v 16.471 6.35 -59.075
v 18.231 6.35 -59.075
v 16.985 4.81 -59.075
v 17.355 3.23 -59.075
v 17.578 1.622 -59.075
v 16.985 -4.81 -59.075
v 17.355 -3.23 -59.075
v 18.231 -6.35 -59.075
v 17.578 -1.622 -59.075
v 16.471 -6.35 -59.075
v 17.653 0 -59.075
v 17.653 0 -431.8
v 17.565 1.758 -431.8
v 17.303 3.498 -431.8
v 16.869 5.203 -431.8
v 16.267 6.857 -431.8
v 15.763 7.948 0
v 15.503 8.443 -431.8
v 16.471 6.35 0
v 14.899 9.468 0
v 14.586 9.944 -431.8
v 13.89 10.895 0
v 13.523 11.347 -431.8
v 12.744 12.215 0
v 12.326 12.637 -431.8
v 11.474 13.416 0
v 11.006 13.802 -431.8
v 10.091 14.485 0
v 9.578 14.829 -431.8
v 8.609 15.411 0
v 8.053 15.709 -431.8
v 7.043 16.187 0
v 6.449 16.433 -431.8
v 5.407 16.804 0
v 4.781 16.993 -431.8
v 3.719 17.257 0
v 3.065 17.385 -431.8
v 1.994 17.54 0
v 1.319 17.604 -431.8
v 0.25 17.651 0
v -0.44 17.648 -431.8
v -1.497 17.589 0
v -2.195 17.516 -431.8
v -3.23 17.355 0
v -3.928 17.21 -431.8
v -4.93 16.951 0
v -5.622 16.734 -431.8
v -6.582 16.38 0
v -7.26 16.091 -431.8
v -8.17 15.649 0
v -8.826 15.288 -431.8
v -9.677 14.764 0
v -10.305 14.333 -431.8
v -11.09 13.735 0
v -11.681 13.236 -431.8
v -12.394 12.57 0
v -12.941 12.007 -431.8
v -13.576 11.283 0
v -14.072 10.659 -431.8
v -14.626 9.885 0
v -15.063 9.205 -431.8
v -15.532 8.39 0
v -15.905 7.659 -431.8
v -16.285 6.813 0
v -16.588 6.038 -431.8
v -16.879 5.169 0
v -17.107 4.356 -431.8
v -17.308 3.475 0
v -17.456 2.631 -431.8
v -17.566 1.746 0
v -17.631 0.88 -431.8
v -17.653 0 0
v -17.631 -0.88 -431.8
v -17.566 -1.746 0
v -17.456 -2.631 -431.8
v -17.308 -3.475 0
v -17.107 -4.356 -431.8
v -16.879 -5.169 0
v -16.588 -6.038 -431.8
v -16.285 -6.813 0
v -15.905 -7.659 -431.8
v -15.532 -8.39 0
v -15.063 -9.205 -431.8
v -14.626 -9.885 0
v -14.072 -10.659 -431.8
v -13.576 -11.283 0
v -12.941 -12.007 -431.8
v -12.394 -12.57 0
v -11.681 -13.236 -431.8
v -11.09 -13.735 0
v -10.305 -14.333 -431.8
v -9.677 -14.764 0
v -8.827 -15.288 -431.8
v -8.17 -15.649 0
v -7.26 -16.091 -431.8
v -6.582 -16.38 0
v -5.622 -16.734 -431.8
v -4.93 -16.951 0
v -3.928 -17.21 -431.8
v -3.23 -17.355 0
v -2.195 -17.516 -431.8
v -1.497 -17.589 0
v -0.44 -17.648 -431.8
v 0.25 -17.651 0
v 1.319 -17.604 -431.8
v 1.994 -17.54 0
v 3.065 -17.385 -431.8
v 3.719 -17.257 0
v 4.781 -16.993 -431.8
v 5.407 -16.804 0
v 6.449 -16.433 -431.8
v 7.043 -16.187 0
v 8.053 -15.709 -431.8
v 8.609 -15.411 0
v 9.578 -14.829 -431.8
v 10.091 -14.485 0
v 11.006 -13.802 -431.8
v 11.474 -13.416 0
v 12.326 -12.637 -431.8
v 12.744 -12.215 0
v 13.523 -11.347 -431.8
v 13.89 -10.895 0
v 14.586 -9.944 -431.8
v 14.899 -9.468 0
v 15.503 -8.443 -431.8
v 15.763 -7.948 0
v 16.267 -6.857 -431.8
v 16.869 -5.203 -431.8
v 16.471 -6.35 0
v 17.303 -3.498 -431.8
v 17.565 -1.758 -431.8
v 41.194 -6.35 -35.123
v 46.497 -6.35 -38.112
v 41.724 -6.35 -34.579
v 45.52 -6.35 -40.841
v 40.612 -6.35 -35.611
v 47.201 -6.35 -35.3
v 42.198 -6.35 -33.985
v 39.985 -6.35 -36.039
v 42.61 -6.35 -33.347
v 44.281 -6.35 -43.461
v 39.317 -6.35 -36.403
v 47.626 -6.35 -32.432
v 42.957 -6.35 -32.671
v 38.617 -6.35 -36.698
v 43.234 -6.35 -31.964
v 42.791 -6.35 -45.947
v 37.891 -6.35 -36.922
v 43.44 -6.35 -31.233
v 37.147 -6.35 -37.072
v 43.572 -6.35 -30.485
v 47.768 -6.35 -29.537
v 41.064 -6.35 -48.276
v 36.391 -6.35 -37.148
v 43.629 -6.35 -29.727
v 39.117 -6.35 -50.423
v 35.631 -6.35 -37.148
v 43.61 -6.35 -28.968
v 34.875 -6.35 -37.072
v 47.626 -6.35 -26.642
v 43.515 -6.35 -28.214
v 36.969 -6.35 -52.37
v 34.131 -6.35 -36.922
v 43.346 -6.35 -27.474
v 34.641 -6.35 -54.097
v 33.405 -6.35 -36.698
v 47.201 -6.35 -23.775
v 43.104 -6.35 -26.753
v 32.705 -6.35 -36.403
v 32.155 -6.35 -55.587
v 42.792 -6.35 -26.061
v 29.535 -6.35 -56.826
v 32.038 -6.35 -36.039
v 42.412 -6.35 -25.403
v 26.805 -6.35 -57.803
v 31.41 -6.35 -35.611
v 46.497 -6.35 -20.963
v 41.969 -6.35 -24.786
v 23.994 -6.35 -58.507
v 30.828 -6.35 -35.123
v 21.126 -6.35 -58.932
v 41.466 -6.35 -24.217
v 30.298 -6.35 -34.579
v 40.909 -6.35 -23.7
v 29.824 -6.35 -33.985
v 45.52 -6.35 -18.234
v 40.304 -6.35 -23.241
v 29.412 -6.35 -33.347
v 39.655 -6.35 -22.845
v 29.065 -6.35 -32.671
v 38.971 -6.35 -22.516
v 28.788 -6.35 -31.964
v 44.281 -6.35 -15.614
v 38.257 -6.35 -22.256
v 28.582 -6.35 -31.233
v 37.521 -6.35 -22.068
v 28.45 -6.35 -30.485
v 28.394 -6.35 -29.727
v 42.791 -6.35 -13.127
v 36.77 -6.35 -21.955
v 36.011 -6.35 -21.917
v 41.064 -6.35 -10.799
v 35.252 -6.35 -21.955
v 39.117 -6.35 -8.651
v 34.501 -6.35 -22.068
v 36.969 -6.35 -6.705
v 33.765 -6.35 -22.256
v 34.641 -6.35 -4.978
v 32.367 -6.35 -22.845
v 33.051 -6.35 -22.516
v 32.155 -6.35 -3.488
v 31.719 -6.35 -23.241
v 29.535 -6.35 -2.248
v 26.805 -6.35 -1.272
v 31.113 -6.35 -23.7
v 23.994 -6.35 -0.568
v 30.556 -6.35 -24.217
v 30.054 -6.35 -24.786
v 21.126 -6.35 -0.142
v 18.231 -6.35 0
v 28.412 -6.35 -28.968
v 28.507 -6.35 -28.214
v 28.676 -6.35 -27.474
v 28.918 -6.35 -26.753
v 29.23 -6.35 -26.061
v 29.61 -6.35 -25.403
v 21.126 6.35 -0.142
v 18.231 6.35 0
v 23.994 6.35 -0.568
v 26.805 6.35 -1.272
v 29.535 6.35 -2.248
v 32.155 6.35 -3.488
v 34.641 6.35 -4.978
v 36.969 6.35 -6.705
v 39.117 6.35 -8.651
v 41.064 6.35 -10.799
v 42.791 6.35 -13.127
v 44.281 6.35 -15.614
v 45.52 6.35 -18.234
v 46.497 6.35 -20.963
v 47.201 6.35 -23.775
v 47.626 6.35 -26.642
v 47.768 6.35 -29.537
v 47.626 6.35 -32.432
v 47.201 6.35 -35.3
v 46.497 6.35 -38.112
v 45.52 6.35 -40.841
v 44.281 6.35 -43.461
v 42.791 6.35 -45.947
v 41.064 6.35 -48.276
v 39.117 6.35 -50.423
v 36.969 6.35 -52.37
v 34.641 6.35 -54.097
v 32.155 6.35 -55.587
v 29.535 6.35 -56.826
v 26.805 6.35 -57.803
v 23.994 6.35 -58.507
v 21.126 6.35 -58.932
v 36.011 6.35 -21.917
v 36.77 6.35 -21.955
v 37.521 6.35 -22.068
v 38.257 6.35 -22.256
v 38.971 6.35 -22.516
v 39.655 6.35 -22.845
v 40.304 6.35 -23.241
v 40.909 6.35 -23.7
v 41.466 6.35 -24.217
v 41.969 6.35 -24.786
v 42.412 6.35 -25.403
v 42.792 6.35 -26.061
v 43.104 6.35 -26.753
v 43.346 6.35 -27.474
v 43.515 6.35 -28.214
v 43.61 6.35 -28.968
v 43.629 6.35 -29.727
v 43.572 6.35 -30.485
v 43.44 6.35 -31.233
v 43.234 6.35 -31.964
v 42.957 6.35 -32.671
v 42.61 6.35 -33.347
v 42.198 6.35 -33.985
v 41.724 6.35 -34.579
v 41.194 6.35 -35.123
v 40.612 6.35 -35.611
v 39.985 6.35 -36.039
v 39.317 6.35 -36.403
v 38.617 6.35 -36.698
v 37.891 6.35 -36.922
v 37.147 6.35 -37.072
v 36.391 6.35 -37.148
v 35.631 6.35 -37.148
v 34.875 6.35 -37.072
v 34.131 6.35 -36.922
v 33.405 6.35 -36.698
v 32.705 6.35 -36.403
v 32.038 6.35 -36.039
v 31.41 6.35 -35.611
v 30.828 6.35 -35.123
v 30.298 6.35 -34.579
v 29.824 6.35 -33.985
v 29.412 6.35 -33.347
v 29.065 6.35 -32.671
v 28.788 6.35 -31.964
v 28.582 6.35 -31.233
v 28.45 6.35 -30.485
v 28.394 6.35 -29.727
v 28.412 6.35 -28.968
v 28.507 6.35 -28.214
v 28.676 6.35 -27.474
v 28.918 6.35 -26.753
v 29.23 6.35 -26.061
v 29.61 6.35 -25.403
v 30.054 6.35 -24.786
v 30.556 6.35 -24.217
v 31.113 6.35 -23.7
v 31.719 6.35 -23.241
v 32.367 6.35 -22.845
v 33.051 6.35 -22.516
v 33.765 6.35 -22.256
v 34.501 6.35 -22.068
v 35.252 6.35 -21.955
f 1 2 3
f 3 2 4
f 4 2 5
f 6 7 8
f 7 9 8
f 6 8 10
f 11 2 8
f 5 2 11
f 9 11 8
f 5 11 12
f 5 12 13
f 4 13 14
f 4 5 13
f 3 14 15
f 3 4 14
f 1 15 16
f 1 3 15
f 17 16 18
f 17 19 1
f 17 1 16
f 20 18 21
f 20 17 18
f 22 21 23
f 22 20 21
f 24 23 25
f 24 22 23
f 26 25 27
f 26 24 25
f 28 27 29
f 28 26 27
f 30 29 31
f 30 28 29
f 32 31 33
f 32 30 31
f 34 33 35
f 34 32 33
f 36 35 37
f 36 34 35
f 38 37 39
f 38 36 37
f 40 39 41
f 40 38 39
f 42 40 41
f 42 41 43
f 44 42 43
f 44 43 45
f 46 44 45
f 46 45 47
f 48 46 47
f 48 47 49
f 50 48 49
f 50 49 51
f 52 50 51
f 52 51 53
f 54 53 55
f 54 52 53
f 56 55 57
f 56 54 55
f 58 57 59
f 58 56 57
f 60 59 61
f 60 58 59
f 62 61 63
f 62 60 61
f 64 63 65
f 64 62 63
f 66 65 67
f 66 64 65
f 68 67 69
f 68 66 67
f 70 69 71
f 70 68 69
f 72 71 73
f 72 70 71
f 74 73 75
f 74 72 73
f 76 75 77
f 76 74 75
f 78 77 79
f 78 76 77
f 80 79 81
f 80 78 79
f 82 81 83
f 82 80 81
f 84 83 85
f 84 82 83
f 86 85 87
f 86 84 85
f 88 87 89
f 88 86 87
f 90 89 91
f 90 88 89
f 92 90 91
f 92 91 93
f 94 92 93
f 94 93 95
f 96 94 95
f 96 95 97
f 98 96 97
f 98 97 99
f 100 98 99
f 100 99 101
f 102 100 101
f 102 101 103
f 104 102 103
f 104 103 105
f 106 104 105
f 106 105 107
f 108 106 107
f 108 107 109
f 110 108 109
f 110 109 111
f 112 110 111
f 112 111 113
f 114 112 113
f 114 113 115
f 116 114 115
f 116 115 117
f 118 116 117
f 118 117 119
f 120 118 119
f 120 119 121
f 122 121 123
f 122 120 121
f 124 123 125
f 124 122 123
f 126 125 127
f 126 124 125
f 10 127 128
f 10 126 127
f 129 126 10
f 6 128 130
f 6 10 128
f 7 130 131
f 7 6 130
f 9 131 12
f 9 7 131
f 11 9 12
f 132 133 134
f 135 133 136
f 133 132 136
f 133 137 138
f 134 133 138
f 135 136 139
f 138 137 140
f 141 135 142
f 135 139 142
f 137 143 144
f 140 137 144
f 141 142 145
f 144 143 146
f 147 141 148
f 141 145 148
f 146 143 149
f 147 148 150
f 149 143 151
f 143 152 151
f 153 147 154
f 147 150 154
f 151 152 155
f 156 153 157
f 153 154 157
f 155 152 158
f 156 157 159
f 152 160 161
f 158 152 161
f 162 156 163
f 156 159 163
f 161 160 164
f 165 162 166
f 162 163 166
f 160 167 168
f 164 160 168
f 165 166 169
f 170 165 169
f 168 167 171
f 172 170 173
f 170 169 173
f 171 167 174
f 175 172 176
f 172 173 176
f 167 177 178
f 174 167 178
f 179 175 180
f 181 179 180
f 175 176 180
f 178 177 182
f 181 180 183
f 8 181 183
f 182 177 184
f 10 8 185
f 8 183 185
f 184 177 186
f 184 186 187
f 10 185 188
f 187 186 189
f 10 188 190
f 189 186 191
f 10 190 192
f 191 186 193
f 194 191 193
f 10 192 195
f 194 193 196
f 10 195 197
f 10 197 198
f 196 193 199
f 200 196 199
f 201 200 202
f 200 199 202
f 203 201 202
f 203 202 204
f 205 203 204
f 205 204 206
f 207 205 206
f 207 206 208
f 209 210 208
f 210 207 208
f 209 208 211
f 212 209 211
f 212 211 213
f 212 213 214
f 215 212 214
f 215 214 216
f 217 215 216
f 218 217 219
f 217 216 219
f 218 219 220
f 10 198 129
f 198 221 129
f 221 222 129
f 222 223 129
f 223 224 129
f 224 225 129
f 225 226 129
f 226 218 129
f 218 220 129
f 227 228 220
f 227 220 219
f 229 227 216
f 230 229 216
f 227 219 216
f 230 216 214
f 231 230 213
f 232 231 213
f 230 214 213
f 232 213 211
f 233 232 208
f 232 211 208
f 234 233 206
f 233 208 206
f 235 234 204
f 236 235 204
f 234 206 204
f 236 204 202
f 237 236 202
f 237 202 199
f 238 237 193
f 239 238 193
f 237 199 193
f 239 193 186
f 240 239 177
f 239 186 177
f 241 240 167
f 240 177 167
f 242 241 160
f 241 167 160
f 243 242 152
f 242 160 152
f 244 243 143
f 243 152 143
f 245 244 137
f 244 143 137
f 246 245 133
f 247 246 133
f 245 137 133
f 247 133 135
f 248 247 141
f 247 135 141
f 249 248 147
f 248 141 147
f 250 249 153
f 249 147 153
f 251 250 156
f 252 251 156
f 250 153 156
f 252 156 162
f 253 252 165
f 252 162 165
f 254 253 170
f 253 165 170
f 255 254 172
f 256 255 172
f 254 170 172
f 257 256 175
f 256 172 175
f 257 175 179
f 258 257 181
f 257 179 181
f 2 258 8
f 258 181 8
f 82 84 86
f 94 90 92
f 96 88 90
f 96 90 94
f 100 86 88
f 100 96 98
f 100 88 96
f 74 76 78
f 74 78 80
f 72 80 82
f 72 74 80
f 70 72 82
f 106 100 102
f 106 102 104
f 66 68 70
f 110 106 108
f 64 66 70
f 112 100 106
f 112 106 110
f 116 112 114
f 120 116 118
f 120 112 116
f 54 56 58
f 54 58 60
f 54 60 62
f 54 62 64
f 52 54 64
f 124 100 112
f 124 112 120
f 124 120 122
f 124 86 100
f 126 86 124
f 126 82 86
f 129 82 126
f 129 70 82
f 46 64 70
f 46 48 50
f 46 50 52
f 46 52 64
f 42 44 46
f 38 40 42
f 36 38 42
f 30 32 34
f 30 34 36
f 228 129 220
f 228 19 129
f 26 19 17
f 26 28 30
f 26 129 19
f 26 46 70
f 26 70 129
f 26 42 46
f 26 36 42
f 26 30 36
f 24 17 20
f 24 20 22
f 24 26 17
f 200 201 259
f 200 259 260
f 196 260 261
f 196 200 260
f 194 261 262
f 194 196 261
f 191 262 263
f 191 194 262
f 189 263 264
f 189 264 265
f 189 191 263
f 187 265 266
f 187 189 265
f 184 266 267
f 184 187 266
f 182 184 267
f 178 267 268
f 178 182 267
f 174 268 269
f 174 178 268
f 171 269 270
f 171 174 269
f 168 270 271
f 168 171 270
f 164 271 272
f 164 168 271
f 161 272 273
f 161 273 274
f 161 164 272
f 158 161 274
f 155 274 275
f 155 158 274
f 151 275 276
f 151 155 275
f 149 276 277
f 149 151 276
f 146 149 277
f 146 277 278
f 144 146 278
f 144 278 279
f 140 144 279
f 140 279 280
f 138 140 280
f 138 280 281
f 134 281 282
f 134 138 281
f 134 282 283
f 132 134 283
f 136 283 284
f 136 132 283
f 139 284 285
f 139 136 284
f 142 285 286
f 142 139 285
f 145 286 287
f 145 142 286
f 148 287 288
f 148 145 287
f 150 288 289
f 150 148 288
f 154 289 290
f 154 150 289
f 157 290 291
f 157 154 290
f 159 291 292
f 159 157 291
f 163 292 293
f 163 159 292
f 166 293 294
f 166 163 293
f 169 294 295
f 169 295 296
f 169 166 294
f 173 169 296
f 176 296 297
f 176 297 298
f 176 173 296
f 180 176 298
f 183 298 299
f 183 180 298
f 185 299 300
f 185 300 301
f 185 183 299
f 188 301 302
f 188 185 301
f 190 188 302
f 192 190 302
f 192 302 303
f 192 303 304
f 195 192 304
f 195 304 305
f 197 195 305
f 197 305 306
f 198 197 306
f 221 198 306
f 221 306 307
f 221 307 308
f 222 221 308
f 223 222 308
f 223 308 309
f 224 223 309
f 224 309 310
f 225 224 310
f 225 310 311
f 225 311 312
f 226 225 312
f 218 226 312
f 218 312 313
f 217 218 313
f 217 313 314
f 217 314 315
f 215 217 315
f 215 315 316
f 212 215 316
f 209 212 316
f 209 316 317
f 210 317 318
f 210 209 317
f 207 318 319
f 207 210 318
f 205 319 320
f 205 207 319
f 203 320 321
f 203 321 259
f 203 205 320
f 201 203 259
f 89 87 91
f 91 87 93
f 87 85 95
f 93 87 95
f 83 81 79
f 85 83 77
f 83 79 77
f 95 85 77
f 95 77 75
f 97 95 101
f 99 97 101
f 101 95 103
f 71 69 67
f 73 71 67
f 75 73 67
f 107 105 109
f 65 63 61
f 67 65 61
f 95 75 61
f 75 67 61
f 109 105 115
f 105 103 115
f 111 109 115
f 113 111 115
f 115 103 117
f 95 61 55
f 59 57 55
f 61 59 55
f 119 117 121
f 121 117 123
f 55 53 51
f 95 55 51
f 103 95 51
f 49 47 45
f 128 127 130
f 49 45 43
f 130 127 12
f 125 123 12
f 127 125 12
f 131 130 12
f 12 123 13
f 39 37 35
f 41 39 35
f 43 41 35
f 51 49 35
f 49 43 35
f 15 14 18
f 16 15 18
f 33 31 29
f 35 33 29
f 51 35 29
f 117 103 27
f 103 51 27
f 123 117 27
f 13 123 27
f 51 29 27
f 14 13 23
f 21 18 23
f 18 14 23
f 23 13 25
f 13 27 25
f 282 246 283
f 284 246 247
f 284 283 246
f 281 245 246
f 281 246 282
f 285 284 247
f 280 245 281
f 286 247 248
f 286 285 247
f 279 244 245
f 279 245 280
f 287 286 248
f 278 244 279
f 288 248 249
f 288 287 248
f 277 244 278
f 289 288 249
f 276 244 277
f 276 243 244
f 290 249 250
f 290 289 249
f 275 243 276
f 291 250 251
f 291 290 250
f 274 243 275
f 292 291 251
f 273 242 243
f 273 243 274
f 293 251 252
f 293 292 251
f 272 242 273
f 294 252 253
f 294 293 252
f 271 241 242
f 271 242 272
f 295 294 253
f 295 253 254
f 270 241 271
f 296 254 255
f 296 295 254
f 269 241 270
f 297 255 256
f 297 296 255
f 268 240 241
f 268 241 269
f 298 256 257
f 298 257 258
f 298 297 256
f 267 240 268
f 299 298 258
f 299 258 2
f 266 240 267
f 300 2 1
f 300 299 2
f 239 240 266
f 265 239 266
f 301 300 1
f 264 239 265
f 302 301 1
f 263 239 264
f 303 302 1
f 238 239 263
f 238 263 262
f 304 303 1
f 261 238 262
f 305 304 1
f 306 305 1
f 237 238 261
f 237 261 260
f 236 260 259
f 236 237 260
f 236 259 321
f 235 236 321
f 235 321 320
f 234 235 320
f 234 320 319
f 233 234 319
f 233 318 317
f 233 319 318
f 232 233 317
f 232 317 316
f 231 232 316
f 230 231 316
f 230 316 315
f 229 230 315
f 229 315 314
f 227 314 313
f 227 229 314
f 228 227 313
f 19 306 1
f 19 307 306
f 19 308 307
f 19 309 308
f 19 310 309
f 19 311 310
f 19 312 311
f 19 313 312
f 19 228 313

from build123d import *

# Parameters (mm, degrees)
SKETCH1_R                = 17.653
BASE_EXTRUDE_DEPTH       = 431.8
BOSS_EXTRUDE1_DEPTH      = 6.35
BOSS_EXTRUDE1_DEPTH_BACK = 6.35
SKETCH4_R                = 7.62


with BuildPart() as part:
    # Sketch1 → Base-Extrude (new body)
    with BuildSketch(Plane.XY):
        Circle(SKETCH1_R)
    extrude(amount=-BASE_EXTRUDE_DEPTH)

    # Sketch4 → Boss-Extrude1 (add, two sides: drawn at the far end of the back side and taken through both)
    with BuildSketch(Plane(origin=(0, 0, 0), x_dir=(-1, 0, 0), z_dir=(0, 1, 0)).offset(-BOSS_EXTRUDE1_DEPTH_BACK)):
        with BuildLine():
            Line((-9.256612772, -59.074644757), (-9.256612772, 0))
            Line((-9.256612772, 0), (-18.231166151, 0))
            ThreePointArc((-18.231166151, 0), (-47.768488529, -29.537322378), (-18.231166151, -59.074644757))
            Line((-18.231166151, -59.074644757), (-9.256612772, -59.074644757))
        make_face()
        with Locations(Location((-36.011166151, -29.537322378, 0), (0, 0, 90))):
            Circle(SKETCH4_R, mode=Mode.SUBTRACT)
    extrude(amount=BOSS_EXTRUDE1_DEPTH + BOSS_EXTRUDE1_DEPTH_BACK)


solid = part.part
